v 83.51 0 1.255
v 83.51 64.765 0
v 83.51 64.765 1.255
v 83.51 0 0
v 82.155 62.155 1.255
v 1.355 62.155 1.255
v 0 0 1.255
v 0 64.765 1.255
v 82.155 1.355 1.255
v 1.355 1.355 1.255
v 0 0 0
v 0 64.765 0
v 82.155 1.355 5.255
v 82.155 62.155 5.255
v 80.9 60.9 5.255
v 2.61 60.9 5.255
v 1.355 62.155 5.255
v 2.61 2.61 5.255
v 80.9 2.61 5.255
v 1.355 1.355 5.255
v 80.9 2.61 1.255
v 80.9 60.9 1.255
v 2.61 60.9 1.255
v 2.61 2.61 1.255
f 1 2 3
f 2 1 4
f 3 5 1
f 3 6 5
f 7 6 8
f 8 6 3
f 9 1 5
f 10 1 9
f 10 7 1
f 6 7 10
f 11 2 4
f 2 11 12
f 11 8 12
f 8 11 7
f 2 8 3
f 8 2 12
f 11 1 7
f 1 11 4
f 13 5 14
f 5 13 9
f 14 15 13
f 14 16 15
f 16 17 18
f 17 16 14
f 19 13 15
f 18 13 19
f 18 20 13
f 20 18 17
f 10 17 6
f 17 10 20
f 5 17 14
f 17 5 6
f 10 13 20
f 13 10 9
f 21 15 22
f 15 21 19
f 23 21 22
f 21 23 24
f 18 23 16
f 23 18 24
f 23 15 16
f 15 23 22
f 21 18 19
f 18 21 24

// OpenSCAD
// file: config.scad
/*
 * config
 *
 * Copyright 2013 <b@Zi.iS>
 * License CC BY 3.0
 */

$fa = 1;
$fs = 1;
preview = 1;

// preview colors
color_steal = [.8,.8,.8];
color_wood = [.3,.3,0];
color_print = [0,.8,0];

// metric bolt sizes
function m_hole(size) = size*1.1/2;
function m_pilot(size) = size*.9/2;

mounting_bolt = 3;

// slightly move and slightly elongate objects in preview to overcome scad rounding errors
module e() {
	if(preview==1) {
		translate([
			0,
			0,
			-.1
		]) {
			scale([
				1,
				1,
				1.1
			]) {
				child();
			}
		}
	} else {
		child();
	}
}

module m_washer(
	size = 3
) {
	color(color_steal) {
		difference() {
			cylinder(
				r = size/2*2,
				h = size*.2
			);
			e() cylinder(
				r = size/2,
				h = size*.2
			);
		}
	}
	translate([
		0,
		0,
		size*.2
	]) {
		child();
	}
}

module m_nut(
	size = 3
) {
	color(color_steal) {
		difference() {
			cylinder(
				r = size*1.8/2,
				h = size*.8,
				$fn = 6
			);
		}
	}
	translate([
		0,
		0,
		size*.8
	]) {
		child();
	}
}

module m_nylock(
	size = 3
) {
	color(color_steal) {
		difference() {
			cylinder(
				r = size*1.8/2,
				h = size,
				$fn = 6
			);
		}
	}
	translate([
		0,
		0,
		size
	]) {
		child();
	}
}

module screw(
	r = 1,
	h = 1,
	pitch = 5,
) {
	linear_extrude(
		height = h,
		twist = -h/pitch*360
	) {
		translate([pitch/5,0,0]) { //H=.2*p works better in plastic then ISO's H=.866*p
			circle(
				r=r 
			);
		}
	}
}

fan40 = [
	40,			//width/length
	10,			//height
	32,			//bolt pitch
	3,			//bolt
];

lm8uu = [
	15.2/2,	//outside
	8/2,	//inside
	26,		//length
];
// main file
/*
 * XRF Relay Base Box
 * Copyright 2013 <b@Zi.iS>
 * License CC BY 3.0
 */

include <config.scad>;

lid();

module box(
	size = [81,61,23],
	t = 1.255
) {
	difference() {
		cube([
			size[0]+t*2,
			size[1]+t*3,
			size[2]+t
		]);
		translate([
			t,
			t,
			t
		]) {
		cube([
			size[0],
			size[1],
			size[2]+1
		]);
			
		}
		translate([
			-1,
			t+size[1]-5,
			t+11,
		]) {
			rotate([
				0,
				90,
				0
			]) {
				cylinder(
					r=10/2,
					h=t+2
				);
			}
		}
		for(x=[0:2]) {
			translate([
				size[0]+t-10-16*x,
				size[1]+t-1,
				size[2]/2+t
			]) {
				rotate([
					-90,
					0,
					0
				]) {
					cylinder(
						r=6.5/2,
						h=t*3+2
					);
				}
			}
		}
	}
}

module lid(
	size = [81,61,23],
	t = 1.255
) {
	difference() {
		union() {
			cube([
				size[0]+t*2,
				size[1]+t*3,
				t
			]);
			translate([
				t+.1,
				t+.1,
				0
			]) {
				cube([
					size[0]-.2,
					size[1]-.2,
					t+4
				]);
			}
		}
		translate([
			t*2+.1,
			t*2+.1,
			t
		]) {
			cube([
				size[0]-t*2-.2,
				size[1]-t*2-.2,
				size[2]+1
			]);
		}
	}
}
